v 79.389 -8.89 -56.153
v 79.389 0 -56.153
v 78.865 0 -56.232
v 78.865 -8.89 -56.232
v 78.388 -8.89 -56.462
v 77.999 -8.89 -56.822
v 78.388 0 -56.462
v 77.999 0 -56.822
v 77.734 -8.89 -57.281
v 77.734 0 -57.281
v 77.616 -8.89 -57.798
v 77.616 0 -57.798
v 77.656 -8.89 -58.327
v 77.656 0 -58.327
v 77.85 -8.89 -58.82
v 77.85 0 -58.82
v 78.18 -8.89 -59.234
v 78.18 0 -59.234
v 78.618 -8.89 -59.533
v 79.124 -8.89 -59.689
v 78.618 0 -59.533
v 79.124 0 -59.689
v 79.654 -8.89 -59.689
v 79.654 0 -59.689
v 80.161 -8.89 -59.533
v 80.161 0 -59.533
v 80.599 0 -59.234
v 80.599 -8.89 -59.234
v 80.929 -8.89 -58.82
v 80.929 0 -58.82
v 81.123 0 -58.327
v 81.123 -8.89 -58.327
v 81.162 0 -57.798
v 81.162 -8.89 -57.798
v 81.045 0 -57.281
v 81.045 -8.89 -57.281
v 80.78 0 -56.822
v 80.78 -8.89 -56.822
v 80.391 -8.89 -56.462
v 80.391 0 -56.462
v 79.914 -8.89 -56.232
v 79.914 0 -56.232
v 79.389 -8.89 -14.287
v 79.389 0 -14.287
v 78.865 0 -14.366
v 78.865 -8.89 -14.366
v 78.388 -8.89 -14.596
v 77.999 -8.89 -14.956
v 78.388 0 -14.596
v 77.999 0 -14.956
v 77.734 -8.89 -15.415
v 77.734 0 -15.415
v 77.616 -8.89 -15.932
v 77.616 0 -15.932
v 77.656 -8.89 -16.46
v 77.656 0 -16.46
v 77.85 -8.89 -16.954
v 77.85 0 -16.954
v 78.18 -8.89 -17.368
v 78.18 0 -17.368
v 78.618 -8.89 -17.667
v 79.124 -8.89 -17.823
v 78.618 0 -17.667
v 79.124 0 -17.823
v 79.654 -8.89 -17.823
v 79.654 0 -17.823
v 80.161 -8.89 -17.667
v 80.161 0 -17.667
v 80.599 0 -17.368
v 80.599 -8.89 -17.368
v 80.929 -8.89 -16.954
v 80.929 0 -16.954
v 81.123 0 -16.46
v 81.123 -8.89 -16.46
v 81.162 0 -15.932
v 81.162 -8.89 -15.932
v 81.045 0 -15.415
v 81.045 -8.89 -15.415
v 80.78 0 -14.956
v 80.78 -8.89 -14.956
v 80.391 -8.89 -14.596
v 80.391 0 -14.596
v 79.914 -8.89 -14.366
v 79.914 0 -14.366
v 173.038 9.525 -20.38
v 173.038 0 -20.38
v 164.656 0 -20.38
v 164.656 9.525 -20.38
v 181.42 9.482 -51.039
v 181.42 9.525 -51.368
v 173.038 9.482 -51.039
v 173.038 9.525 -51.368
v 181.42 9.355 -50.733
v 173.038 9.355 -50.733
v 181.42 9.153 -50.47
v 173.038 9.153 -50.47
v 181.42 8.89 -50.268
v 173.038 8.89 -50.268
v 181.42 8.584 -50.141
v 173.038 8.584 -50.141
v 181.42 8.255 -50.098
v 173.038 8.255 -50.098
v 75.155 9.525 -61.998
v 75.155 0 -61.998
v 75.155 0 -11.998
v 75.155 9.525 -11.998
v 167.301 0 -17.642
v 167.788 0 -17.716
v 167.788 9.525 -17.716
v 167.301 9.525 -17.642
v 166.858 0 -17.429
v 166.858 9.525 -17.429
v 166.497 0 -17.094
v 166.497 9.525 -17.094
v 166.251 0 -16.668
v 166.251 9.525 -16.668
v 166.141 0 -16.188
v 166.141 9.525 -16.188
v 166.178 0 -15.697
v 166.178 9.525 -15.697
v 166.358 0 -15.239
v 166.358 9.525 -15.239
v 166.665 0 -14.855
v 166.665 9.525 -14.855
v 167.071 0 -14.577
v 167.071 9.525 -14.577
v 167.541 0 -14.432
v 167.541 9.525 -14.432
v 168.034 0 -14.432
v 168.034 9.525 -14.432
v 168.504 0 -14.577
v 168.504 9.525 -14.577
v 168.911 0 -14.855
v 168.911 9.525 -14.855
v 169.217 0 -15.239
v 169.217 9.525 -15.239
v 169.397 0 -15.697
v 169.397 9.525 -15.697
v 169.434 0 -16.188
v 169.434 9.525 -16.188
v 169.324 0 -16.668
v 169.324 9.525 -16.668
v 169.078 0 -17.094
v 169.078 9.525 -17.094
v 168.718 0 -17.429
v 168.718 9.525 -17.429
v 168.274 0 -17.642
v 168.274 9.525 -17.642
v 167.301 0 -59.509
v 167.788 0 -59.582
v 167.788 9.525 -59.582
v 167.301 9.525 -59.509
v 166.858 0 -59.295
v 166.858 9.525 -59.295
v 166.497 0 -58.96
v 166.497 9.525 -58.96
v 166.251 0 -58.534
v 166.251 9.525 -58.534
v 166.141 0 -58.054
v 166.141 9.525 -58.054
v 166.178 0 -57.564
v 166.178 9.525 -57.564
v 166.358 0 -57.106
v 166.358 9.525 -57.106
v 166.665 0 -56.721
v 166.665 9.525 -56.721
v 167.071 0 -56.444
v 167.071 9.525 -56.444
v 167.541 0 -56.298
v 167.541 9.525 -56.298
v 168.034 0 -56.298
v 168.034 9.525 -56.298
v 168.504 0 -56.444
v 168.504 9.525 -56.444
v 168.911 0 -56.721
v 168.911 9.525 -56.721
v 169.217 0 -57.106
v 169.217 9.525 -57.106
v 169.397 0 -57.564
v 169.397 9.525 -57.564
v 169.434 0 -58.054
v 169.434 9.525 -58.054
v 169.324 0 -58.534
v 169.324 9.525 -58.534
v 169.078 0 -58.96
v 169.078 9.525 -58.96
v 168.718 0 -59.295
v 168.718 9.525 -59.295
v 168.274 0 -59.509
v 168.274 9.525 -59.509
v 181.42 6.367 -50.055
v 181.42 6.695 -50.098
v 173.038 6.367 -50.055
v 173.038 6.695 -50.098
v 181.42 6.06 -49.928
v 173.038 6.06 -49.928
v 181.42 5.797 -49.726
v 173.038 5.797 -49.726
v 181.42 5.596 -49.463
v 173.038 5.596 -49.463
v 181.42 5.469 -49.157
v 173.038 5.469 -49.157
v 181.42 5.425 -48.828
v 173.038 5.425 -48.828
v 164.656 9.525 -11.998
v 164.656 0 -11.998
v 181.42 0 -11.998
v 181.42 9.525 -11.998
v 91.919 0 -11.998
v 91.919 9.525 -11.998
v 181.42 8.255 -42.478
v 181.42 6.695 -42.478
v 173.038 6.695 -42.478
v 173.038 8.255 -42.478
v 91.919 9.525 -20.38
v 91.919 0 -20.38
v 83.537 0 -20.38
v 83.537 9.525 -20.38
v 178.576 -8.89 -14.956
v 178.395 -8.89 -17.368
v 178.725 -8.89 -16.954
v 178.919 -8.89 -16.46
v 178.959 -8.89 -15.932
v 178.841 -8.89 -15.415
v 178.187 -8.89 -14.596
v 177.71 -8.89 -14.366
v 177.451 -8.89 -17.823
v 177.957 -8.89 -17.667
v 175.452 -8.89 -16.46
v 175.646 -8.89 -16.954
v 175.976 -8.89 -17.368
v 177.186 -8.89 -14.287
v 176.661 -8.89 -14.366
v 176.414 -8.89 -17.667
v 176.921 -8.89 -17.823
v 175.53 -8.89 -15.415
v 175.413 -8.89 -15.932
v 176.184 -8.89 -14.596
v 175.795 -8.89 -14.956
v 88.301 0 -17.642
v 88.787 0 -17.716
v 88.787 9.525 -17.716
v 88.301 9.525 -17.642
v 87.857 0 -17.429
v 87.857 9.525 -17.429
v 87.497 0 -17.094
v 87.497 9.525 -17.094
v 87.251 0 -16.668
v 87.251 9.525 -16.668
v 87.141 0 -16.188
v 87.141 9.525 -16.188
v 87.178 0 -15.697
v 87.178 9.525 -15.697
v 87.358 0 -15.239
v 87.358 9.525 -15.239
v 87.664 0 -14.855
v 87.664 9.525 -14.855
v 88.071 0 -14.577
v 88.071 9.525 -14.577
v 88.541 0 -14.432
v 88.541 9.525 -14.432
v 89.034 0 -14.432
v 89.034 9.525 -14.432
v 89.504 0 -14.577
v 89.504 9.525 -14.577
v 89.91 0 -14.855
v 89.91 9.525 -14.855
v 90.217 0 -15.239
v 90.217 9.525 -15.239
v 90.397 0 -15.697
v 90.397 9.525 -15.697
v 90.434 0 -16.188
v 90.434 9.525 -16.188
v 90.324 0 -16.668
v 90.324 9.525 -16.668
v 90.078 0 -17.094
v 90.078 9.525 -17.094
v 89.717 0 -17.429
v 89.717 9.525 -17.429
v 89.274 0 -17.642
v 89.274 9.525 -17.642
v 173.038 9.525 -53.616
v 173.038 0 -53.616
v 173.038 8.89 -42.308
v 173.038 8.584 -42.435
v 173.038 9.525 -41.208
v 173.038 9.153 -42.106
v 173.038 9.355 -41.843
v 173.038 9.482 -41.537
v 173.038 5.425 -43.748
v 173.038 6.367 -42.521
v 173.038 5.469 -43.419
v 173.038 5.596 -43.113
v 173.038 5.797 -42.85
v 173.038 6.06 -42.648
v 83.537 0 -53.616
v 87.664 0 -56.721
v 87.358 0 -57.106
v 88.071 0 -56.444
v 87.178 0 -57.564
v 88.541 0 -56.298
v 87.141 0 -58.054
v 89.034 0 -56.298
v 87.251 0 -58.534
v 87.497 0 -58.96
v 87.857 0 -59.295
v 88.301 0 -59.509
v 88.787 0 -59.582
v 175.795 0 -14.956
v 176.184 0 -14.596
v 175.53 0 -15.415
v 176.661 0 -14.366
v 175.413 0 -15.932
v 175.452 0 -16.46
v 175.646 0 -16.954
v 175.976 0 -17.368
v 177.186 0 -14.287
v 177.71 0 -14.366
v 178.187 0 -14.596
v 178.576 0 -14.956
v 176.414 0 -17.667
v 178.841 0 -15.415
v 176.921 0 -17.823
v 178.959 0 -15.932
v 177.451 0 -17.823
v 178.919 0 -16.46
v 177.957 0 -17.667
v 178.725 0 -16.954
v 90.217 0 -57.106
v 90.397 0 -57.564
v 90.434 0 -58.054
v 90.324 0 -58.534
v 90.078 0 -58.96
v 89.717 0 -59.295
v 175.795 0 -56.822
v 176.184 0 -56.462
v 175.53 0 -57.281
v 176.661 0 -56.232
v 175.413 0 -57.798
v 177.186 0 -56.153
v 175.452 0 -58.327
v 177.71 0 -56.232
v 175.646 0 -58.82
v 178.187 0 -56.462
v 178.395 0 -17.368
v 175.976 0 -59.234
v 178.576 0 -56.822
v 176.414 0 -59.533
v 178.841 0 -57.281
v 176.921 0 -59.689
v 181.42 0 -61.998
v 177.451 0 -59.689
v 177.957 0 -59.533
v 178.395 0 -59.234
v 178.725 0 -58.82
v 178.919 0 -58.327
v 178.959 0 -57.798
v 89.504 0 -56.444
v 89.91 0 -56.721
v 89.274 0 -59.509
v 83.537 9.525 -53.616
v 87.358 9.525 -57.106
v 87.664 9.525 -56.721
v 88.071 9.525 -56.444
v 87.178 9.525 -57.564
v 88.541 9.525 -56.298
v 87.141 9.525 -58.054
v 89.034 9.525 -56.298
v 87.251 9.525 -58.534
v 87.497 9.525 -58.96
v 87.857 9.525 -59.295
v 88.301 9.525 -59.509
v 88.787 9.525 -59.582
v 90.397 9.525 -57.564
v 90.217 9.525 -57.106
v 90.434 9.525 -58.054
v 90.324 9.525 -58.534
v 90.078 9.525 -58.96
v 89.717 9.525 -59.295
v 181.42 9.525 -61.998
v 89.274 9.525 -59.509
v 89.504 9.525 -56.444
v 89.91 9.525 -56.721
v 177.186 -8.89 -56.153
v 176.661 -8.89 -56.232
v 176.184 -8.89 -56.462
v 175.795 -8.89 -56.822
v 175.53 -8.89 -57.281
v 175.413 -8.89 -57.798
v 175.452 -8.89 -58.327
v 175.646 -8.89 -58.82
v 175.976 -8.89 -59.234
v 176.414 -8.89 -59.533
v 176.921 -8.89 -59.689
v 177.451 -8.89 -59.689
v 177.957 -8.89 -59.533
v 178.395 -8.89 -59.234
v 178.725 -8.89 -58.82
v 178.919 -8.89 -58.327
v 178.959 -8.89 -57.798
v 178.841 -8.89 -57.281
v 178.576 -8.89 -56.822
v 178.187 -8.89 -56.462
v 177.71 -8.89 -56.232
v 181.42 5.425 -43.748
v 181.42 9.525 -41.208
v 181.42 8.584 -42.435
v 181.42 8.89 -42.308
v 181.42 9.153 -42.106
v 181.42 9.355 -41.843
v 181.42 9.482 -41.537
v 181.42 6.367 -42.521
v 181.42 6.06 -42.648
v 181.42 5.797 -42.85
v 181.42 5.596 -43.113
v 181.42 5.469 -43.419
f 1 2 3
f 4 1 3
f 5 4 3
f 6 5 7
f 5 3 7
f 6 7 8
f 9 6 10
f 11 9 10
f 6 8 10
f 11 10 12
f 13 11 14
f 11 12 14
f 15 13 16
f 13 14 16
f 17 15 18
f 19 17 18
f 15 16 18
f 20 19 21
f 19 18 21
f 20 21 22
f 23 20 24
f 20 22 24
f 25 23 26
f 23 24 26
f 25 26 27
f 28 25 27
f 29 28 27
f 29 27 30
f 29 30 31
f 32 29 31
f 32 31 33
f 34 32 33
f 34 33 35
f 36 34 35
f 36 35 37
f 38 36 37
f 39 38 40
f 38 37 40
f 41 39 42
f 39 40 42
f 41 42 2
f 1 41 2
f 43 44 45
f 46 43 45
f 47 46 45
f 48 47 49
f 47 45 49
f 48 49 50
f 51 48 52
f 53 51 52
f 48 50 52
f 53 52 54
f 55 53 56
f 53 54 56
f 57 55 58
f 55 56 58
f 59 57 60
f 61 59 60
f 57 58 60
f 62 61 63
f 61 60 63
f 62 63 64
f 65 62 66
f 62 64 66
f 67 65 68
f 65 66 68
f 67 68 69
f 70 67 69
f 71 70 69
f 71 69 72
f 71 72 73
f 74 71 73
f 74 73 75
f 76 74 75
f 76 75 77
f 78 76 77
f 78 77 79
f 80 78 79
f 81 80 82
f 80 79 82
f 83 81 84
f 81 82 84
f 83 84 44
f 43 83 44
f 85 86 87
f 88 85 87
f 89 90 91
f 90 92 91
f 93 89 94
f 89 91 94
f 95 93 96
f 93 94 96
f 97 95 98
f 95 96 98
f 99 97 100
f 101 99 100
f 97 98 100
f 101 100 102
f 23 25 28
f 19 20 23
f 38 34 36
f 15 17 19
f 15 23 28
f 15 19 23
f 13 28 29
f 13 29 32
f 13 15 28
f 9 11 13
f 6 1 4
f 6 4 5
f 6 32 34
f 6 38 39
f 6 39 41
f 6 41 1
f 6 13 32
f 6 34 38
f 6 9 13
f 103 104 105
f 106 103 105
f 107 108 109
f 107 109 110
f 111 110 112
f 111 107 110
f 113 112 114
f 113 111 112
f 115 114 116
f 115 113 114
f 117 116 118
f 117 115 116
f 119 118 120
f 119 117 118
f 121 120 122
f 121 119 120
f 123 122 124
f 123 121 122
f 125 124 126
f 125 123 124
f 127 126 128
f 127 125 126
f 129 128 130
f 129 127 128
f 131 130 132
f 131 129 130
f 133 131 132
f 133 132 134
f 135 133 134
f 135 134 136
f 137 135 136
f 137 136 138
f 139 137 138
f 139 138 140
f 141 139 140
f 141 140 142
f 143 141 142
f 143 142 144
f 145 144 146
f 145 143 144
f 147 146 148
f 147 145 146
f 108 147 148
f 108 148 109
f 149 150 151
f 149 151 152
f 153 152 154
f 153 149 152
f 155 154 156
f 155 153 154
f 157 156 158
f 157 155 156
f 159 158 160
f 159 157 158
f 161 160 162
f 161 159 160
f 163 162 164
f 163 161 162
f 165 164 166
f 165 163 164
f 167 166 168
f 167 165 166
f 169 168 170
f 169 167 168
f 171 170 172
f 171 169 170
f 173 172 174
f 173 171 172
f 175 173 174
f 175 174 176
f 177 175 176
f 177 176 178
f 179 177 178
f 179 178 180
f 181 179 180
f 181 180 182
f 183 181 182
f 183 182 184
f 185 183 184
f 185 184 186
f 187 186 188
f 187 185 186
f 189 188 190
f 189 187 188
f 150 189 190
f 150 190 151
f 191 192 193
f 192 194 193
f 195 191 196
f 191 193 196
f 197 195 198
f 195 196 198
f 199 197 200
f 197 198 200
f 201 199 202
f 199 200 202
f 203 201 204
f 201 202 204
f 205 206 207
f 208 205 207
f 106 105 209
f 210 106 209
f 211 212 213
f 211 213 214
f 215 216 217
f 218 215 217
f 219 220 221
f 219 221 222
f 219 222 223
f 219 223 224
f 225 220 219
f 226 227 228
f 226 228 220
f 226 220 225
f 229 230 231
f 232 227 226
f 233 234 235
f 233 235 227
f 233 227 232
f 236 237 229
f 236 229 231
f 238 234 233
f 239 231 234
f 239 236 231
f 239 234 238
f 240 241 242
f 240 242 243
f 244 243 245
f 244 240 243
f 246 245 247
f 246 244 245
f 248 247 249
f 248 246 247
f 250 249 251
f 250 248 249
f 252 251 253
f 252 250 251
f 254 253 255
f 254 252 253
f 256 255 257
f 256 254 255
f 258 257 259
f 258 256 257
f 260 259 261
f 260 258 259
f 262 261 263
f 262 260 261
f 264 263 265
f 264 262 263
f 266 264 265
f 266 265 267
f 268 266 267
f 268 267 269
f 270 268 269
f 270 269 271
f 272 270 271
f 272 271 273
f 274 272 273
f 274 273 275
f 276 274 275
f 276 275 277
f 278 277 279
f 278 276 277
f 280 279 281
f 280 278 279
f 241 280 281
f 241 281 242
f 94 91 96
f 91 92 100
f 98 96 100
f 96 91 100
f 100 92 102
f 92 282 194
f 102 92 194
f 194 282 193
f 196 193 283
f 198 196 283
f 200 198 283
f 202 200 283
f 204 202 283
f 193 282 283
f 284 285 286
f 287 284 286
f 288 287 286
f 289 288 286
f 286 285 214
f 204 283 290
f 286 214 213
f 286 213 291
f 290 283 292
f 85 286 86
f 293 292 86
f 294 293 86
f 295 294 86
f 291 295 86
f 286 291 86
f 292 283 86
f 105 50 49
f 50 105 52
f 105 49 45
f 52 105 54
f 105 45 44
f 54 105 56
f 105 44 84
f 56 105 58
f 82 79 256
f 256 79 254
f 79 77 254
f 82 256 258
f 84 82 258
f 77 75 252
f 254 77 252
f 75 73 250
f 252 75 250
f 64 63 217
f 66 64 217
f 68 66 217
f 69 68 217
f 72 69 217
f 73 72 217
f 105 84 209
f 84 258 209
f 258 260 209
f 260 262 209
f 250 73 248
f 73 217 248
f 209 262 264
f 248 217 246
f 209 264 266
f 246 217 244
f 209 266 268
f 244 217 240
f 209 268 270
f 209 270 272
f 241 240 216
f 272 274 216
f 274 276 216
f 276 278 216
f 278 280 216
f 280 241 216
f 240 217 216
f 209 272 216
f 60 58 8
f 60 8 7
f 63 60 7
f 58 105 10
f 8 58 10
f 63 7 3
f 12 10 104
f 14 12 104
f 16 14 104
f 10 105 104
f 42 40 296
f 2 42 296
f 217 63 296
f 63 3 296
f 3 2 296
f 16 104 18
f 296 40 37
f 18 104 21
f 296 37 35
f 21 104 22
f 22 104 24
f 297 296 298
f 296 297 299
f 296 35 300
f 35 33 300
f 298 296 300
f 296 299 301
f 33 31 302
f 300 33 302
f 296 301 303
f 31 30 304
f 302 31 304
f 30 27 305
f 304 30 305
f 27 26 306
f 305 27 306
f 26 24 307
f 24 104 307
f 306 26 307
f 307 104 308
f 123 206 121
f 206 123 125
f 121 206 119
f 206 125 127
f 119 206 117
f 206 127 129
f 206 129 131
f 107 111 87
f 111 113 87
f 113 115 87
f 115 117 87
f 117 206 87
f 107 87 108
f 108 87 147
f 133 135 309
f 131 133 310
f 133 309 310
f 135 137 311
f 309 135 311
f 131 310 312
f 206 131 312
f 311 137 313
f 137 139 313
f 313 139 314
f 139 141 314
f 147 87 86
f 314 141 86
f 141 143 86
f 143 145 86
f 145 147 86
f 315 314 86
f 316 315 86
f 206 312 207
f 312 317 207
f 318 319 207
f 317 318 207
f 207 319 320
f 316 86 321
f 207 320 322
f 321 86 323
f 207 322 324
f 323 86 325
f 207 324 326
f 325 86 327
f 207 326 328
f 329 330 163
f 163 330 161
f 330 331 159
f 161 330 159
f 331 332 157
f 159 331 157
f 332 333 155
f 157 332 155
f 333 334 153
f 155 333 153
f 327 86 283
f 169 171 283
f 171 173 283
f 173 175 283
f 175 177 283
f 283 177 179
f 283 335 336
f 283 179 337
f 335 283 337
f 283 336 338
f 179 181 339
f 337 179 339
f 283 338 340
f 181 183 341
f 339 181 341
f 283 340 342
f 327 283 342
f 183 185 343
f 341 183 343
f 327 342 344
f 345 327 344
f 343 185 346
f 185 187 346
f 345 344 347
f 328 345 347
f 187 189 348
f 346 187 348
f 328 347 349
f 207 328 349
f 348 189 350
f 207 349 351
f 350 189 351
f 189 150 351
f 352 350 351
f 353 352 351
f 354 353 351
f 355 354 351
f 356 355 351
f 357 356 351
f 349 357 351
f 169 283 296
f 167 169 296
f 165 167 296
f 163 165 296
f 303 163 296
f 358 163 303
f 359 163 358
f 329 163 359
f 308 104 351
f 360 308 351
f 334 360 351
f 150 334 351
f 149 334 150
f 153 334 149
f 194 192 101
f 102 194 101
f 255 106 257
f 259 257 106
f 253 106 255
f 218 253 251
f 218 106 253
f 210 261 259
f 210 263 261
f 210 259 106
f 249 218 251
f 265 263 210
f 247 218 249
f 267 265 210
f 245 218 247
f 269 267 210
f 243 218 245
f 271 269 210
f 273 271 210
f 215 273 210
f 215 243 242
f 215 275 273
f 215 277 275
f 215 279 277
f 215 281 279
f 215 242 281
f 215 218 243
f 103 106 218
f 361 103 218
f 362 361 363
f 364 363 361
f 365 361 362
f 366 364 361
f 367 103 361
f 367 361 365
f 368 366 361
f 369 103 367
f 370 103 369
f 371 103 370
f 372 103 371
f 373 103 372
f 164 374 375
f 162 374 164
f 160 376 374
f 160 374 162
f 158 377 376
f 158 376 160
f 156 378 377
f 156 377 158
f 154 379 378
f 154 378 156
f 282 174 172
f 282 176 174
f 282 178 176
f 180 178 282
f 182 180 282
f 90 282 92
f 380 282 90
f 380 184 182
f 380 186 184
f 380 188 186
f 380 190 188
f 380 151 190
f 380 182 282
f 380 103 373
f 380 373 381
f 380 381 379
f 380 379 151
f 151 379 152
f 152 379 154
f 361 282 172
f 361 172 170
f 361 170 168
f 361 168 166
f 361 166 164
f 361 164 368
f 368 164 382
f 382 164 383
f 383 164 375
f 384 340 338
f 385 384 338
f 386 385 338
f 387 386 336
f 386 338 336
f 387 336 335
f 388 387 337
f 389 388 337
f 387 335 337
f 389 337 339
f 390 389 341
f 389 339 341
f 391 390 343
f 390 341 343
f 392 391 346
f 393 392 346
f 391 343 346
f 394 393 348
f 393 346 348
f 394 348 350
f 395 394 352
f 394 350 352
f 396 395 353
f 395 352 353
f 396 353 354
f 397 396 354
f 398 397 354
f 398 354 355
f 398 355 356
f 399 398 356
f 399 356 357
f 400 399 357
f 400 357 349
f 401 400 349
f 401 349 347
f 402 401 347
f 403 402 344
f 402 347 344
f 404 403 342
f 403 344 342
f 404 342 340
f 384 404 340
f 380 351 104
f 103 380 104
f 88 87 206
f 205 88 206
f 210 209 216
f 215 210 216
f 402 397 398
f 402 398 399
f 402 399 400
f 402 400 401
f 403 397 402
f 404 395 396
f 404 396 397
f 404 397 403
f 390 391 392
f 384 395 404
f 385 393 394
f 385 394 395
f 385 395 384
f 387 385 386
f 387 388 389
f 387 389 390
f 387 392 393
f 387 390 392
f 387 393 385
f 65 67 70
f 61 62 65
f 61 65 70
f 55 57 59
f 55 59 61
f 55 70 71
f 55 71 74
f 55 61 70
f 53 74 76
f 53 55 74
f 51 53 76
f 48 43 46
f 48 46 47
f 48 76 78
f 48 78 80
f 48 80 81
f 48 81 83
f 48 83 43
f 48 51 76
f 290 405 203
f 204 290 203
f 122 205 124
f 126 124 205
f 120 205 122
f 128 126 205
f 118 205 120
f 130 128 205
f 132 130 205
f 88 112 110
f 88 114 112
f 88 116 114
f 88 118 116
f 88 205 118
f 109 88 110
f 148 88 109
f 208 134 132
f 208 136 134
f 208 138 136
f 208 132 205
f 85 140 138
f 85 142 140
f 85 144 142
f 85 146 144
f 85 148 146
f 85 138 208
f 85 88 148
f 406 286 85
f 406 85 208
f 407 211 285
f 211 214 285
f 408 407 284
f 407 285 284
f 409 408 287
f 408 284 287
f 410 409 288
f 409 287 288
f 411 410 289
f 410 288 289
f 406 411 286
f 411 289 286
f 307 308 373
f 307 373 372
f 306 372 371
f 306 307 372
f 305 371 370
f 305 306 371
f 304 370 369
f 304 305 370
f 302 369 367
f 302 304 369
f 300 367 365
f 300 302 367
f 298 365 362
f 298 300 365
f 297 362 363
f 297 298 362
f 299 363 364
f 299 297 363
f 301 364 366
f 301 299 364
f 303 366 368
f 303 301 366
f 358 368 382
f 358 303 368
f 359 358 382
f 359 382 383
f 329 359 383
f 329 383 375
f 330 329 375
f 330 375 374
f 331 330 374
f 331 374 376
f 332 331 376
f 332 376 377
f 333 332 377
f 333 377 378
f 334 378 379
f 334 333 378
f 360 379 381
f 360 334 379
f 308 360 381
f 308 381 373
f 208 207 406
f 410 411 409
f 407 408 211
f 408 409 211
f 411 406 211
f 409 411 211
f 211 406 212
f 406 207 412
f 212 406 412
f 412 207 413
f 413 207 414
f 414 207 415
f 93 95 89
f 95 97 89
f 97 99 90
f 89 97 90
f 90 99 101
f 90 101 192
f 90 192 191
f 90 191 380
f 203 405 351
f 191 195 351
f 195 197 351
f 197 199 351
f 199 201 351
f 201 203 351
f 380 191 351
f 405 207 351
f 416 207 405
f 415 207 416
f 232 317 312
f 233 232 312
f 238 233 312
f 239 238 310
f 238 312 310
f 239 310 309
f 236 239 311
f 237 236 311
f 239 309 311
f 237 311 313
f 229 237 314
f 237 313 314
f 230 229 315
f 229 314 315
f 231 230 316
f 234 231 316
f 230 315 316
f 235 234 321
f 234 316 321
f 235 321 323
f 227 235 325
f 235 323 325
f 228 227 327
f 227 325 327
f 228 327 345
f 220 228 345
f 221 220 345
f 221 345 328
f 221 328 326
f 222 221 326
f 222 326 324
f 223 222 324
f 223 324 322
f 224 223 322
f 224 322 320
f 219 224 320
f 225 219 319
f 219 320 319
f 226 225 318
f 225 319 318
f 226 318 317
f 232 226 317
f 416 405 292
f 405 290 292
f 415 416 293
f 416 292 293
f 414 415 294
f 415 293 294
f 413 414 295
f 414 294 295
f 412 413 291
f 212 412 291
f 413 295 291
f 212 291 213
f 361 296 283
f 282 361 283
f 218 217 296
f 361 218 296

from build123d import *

# Parameters (mm, degrees)
SKETCH1_R           = 1.651
BOSS_EXTRUDE1_DEPTH = 9.525
SKETCH2_W           = 7.62
SKETCH2_H           = 4.099575227
CUT_EXTRUDE7_DEPTH  = 8.89
FILLET2_R           = 1.27
SKETCH3_R           = 1.778
BOSS_EXTRUDE3_DEPTH = 8.89


with BuildPart() as part:
    # Sketch1 → Boss-Extrude1 (new body)
    with BuildSketch(Plane(origin=(0, 0, 0), x_dir=(1, 0, 0), z_dir=(0, 1, 0))):
        Polygon((75.155177047, 61.997896552), (75.155177047, 11.997896552), (91.919177047, 11.997896552), (91.919177047, 20.379896552), (83.537177047, 20.379896552), (83.537177047, 53.615896552), (173.037829354, 53.615896552), (173.037829354, 20.379896552), (164.655829354, 20.379896552), (164.655829354, 11.997896552), (181.419829354, 11.997896552), (181.419829354, 61.997896552), align=None)
        with Locations(Location((88.7874552, 16.064784874, 0), (0, 0, 90))):
            Circle(SKETCH1_R, mode=Mode.SUBTRACT)
        with Locations(Location((167.7875512, 57.93100823, 0), (0, 0, 90))):
            Circle(SKETCH1_R, mode=Mode.SUBTRACT)
        with Locations(Location((88.7874552, 57.93100823, 0), (0, 0, 90))):
            Circle(SKETCH1_R, mode=Mode.SUBTRACT)
        with Locations(Location((167.7875512, 16.064784874, 0), (0, 0, 90))):
            Circle(SKETCH1_R, mode=Mode.SUBTRACT)
    extrude(amount=BOSS_EXTRUDE1_DEPTH)

    # Sketch2 → Cut-Extrude7 (cut)
    with BuildSketch(Plane(origin=(181.419829354, 0, 0), x_dir=(0, 0, -1), z_dir=(1, 0, 0))):
        with Locations((46.287896552, 7.475212387)):
            Rectangle(SKETCH2_W, SKETCH2_H)
    extrude(amount=-CUT_EXTRUDE7_DEPTH, mode=Mode.SUBTRACT)

    # Fillet2
    fillet2_edges = [part.edges().sort_by_distance(p)[0] for p in [
        (177.228829354, 9.525, -42.477896552),
        (177.228829354, 9.525, -50.097896552),
        (177.228829354, 5.425424773, -50.097896552),
        (177.228829354, 5.425424773, -42.477896552),
    ]]
    fillet(fillet2_edges, radius=FILLET2_R)

    # Sketch3 → Boss-Extrude3 (add)
    with BuildSketch(Plane.XZ):
        with Locations(Location((79.3894552, -16.064784874, 0), (0, 0, 90))):
            Circle(SKETCH3_R)
        with Locations(Location((177.1855512, -16.064784874, 0), (0, 0, 90))):
            Circle(SKETCH3_R)
        with Locations(Location((79.3894552, -57.93100823, 0), (0, 0, 90))):
            Circle(SKETCH3_R)
        with Locations(Location((177.1855512, -57.93100823, 0), (0, 0, 90))):
            Circle(SKETCH3_R)
    extrude(amount=BOSS_EXTRUDE3_DEPTH)


solid = part.part
